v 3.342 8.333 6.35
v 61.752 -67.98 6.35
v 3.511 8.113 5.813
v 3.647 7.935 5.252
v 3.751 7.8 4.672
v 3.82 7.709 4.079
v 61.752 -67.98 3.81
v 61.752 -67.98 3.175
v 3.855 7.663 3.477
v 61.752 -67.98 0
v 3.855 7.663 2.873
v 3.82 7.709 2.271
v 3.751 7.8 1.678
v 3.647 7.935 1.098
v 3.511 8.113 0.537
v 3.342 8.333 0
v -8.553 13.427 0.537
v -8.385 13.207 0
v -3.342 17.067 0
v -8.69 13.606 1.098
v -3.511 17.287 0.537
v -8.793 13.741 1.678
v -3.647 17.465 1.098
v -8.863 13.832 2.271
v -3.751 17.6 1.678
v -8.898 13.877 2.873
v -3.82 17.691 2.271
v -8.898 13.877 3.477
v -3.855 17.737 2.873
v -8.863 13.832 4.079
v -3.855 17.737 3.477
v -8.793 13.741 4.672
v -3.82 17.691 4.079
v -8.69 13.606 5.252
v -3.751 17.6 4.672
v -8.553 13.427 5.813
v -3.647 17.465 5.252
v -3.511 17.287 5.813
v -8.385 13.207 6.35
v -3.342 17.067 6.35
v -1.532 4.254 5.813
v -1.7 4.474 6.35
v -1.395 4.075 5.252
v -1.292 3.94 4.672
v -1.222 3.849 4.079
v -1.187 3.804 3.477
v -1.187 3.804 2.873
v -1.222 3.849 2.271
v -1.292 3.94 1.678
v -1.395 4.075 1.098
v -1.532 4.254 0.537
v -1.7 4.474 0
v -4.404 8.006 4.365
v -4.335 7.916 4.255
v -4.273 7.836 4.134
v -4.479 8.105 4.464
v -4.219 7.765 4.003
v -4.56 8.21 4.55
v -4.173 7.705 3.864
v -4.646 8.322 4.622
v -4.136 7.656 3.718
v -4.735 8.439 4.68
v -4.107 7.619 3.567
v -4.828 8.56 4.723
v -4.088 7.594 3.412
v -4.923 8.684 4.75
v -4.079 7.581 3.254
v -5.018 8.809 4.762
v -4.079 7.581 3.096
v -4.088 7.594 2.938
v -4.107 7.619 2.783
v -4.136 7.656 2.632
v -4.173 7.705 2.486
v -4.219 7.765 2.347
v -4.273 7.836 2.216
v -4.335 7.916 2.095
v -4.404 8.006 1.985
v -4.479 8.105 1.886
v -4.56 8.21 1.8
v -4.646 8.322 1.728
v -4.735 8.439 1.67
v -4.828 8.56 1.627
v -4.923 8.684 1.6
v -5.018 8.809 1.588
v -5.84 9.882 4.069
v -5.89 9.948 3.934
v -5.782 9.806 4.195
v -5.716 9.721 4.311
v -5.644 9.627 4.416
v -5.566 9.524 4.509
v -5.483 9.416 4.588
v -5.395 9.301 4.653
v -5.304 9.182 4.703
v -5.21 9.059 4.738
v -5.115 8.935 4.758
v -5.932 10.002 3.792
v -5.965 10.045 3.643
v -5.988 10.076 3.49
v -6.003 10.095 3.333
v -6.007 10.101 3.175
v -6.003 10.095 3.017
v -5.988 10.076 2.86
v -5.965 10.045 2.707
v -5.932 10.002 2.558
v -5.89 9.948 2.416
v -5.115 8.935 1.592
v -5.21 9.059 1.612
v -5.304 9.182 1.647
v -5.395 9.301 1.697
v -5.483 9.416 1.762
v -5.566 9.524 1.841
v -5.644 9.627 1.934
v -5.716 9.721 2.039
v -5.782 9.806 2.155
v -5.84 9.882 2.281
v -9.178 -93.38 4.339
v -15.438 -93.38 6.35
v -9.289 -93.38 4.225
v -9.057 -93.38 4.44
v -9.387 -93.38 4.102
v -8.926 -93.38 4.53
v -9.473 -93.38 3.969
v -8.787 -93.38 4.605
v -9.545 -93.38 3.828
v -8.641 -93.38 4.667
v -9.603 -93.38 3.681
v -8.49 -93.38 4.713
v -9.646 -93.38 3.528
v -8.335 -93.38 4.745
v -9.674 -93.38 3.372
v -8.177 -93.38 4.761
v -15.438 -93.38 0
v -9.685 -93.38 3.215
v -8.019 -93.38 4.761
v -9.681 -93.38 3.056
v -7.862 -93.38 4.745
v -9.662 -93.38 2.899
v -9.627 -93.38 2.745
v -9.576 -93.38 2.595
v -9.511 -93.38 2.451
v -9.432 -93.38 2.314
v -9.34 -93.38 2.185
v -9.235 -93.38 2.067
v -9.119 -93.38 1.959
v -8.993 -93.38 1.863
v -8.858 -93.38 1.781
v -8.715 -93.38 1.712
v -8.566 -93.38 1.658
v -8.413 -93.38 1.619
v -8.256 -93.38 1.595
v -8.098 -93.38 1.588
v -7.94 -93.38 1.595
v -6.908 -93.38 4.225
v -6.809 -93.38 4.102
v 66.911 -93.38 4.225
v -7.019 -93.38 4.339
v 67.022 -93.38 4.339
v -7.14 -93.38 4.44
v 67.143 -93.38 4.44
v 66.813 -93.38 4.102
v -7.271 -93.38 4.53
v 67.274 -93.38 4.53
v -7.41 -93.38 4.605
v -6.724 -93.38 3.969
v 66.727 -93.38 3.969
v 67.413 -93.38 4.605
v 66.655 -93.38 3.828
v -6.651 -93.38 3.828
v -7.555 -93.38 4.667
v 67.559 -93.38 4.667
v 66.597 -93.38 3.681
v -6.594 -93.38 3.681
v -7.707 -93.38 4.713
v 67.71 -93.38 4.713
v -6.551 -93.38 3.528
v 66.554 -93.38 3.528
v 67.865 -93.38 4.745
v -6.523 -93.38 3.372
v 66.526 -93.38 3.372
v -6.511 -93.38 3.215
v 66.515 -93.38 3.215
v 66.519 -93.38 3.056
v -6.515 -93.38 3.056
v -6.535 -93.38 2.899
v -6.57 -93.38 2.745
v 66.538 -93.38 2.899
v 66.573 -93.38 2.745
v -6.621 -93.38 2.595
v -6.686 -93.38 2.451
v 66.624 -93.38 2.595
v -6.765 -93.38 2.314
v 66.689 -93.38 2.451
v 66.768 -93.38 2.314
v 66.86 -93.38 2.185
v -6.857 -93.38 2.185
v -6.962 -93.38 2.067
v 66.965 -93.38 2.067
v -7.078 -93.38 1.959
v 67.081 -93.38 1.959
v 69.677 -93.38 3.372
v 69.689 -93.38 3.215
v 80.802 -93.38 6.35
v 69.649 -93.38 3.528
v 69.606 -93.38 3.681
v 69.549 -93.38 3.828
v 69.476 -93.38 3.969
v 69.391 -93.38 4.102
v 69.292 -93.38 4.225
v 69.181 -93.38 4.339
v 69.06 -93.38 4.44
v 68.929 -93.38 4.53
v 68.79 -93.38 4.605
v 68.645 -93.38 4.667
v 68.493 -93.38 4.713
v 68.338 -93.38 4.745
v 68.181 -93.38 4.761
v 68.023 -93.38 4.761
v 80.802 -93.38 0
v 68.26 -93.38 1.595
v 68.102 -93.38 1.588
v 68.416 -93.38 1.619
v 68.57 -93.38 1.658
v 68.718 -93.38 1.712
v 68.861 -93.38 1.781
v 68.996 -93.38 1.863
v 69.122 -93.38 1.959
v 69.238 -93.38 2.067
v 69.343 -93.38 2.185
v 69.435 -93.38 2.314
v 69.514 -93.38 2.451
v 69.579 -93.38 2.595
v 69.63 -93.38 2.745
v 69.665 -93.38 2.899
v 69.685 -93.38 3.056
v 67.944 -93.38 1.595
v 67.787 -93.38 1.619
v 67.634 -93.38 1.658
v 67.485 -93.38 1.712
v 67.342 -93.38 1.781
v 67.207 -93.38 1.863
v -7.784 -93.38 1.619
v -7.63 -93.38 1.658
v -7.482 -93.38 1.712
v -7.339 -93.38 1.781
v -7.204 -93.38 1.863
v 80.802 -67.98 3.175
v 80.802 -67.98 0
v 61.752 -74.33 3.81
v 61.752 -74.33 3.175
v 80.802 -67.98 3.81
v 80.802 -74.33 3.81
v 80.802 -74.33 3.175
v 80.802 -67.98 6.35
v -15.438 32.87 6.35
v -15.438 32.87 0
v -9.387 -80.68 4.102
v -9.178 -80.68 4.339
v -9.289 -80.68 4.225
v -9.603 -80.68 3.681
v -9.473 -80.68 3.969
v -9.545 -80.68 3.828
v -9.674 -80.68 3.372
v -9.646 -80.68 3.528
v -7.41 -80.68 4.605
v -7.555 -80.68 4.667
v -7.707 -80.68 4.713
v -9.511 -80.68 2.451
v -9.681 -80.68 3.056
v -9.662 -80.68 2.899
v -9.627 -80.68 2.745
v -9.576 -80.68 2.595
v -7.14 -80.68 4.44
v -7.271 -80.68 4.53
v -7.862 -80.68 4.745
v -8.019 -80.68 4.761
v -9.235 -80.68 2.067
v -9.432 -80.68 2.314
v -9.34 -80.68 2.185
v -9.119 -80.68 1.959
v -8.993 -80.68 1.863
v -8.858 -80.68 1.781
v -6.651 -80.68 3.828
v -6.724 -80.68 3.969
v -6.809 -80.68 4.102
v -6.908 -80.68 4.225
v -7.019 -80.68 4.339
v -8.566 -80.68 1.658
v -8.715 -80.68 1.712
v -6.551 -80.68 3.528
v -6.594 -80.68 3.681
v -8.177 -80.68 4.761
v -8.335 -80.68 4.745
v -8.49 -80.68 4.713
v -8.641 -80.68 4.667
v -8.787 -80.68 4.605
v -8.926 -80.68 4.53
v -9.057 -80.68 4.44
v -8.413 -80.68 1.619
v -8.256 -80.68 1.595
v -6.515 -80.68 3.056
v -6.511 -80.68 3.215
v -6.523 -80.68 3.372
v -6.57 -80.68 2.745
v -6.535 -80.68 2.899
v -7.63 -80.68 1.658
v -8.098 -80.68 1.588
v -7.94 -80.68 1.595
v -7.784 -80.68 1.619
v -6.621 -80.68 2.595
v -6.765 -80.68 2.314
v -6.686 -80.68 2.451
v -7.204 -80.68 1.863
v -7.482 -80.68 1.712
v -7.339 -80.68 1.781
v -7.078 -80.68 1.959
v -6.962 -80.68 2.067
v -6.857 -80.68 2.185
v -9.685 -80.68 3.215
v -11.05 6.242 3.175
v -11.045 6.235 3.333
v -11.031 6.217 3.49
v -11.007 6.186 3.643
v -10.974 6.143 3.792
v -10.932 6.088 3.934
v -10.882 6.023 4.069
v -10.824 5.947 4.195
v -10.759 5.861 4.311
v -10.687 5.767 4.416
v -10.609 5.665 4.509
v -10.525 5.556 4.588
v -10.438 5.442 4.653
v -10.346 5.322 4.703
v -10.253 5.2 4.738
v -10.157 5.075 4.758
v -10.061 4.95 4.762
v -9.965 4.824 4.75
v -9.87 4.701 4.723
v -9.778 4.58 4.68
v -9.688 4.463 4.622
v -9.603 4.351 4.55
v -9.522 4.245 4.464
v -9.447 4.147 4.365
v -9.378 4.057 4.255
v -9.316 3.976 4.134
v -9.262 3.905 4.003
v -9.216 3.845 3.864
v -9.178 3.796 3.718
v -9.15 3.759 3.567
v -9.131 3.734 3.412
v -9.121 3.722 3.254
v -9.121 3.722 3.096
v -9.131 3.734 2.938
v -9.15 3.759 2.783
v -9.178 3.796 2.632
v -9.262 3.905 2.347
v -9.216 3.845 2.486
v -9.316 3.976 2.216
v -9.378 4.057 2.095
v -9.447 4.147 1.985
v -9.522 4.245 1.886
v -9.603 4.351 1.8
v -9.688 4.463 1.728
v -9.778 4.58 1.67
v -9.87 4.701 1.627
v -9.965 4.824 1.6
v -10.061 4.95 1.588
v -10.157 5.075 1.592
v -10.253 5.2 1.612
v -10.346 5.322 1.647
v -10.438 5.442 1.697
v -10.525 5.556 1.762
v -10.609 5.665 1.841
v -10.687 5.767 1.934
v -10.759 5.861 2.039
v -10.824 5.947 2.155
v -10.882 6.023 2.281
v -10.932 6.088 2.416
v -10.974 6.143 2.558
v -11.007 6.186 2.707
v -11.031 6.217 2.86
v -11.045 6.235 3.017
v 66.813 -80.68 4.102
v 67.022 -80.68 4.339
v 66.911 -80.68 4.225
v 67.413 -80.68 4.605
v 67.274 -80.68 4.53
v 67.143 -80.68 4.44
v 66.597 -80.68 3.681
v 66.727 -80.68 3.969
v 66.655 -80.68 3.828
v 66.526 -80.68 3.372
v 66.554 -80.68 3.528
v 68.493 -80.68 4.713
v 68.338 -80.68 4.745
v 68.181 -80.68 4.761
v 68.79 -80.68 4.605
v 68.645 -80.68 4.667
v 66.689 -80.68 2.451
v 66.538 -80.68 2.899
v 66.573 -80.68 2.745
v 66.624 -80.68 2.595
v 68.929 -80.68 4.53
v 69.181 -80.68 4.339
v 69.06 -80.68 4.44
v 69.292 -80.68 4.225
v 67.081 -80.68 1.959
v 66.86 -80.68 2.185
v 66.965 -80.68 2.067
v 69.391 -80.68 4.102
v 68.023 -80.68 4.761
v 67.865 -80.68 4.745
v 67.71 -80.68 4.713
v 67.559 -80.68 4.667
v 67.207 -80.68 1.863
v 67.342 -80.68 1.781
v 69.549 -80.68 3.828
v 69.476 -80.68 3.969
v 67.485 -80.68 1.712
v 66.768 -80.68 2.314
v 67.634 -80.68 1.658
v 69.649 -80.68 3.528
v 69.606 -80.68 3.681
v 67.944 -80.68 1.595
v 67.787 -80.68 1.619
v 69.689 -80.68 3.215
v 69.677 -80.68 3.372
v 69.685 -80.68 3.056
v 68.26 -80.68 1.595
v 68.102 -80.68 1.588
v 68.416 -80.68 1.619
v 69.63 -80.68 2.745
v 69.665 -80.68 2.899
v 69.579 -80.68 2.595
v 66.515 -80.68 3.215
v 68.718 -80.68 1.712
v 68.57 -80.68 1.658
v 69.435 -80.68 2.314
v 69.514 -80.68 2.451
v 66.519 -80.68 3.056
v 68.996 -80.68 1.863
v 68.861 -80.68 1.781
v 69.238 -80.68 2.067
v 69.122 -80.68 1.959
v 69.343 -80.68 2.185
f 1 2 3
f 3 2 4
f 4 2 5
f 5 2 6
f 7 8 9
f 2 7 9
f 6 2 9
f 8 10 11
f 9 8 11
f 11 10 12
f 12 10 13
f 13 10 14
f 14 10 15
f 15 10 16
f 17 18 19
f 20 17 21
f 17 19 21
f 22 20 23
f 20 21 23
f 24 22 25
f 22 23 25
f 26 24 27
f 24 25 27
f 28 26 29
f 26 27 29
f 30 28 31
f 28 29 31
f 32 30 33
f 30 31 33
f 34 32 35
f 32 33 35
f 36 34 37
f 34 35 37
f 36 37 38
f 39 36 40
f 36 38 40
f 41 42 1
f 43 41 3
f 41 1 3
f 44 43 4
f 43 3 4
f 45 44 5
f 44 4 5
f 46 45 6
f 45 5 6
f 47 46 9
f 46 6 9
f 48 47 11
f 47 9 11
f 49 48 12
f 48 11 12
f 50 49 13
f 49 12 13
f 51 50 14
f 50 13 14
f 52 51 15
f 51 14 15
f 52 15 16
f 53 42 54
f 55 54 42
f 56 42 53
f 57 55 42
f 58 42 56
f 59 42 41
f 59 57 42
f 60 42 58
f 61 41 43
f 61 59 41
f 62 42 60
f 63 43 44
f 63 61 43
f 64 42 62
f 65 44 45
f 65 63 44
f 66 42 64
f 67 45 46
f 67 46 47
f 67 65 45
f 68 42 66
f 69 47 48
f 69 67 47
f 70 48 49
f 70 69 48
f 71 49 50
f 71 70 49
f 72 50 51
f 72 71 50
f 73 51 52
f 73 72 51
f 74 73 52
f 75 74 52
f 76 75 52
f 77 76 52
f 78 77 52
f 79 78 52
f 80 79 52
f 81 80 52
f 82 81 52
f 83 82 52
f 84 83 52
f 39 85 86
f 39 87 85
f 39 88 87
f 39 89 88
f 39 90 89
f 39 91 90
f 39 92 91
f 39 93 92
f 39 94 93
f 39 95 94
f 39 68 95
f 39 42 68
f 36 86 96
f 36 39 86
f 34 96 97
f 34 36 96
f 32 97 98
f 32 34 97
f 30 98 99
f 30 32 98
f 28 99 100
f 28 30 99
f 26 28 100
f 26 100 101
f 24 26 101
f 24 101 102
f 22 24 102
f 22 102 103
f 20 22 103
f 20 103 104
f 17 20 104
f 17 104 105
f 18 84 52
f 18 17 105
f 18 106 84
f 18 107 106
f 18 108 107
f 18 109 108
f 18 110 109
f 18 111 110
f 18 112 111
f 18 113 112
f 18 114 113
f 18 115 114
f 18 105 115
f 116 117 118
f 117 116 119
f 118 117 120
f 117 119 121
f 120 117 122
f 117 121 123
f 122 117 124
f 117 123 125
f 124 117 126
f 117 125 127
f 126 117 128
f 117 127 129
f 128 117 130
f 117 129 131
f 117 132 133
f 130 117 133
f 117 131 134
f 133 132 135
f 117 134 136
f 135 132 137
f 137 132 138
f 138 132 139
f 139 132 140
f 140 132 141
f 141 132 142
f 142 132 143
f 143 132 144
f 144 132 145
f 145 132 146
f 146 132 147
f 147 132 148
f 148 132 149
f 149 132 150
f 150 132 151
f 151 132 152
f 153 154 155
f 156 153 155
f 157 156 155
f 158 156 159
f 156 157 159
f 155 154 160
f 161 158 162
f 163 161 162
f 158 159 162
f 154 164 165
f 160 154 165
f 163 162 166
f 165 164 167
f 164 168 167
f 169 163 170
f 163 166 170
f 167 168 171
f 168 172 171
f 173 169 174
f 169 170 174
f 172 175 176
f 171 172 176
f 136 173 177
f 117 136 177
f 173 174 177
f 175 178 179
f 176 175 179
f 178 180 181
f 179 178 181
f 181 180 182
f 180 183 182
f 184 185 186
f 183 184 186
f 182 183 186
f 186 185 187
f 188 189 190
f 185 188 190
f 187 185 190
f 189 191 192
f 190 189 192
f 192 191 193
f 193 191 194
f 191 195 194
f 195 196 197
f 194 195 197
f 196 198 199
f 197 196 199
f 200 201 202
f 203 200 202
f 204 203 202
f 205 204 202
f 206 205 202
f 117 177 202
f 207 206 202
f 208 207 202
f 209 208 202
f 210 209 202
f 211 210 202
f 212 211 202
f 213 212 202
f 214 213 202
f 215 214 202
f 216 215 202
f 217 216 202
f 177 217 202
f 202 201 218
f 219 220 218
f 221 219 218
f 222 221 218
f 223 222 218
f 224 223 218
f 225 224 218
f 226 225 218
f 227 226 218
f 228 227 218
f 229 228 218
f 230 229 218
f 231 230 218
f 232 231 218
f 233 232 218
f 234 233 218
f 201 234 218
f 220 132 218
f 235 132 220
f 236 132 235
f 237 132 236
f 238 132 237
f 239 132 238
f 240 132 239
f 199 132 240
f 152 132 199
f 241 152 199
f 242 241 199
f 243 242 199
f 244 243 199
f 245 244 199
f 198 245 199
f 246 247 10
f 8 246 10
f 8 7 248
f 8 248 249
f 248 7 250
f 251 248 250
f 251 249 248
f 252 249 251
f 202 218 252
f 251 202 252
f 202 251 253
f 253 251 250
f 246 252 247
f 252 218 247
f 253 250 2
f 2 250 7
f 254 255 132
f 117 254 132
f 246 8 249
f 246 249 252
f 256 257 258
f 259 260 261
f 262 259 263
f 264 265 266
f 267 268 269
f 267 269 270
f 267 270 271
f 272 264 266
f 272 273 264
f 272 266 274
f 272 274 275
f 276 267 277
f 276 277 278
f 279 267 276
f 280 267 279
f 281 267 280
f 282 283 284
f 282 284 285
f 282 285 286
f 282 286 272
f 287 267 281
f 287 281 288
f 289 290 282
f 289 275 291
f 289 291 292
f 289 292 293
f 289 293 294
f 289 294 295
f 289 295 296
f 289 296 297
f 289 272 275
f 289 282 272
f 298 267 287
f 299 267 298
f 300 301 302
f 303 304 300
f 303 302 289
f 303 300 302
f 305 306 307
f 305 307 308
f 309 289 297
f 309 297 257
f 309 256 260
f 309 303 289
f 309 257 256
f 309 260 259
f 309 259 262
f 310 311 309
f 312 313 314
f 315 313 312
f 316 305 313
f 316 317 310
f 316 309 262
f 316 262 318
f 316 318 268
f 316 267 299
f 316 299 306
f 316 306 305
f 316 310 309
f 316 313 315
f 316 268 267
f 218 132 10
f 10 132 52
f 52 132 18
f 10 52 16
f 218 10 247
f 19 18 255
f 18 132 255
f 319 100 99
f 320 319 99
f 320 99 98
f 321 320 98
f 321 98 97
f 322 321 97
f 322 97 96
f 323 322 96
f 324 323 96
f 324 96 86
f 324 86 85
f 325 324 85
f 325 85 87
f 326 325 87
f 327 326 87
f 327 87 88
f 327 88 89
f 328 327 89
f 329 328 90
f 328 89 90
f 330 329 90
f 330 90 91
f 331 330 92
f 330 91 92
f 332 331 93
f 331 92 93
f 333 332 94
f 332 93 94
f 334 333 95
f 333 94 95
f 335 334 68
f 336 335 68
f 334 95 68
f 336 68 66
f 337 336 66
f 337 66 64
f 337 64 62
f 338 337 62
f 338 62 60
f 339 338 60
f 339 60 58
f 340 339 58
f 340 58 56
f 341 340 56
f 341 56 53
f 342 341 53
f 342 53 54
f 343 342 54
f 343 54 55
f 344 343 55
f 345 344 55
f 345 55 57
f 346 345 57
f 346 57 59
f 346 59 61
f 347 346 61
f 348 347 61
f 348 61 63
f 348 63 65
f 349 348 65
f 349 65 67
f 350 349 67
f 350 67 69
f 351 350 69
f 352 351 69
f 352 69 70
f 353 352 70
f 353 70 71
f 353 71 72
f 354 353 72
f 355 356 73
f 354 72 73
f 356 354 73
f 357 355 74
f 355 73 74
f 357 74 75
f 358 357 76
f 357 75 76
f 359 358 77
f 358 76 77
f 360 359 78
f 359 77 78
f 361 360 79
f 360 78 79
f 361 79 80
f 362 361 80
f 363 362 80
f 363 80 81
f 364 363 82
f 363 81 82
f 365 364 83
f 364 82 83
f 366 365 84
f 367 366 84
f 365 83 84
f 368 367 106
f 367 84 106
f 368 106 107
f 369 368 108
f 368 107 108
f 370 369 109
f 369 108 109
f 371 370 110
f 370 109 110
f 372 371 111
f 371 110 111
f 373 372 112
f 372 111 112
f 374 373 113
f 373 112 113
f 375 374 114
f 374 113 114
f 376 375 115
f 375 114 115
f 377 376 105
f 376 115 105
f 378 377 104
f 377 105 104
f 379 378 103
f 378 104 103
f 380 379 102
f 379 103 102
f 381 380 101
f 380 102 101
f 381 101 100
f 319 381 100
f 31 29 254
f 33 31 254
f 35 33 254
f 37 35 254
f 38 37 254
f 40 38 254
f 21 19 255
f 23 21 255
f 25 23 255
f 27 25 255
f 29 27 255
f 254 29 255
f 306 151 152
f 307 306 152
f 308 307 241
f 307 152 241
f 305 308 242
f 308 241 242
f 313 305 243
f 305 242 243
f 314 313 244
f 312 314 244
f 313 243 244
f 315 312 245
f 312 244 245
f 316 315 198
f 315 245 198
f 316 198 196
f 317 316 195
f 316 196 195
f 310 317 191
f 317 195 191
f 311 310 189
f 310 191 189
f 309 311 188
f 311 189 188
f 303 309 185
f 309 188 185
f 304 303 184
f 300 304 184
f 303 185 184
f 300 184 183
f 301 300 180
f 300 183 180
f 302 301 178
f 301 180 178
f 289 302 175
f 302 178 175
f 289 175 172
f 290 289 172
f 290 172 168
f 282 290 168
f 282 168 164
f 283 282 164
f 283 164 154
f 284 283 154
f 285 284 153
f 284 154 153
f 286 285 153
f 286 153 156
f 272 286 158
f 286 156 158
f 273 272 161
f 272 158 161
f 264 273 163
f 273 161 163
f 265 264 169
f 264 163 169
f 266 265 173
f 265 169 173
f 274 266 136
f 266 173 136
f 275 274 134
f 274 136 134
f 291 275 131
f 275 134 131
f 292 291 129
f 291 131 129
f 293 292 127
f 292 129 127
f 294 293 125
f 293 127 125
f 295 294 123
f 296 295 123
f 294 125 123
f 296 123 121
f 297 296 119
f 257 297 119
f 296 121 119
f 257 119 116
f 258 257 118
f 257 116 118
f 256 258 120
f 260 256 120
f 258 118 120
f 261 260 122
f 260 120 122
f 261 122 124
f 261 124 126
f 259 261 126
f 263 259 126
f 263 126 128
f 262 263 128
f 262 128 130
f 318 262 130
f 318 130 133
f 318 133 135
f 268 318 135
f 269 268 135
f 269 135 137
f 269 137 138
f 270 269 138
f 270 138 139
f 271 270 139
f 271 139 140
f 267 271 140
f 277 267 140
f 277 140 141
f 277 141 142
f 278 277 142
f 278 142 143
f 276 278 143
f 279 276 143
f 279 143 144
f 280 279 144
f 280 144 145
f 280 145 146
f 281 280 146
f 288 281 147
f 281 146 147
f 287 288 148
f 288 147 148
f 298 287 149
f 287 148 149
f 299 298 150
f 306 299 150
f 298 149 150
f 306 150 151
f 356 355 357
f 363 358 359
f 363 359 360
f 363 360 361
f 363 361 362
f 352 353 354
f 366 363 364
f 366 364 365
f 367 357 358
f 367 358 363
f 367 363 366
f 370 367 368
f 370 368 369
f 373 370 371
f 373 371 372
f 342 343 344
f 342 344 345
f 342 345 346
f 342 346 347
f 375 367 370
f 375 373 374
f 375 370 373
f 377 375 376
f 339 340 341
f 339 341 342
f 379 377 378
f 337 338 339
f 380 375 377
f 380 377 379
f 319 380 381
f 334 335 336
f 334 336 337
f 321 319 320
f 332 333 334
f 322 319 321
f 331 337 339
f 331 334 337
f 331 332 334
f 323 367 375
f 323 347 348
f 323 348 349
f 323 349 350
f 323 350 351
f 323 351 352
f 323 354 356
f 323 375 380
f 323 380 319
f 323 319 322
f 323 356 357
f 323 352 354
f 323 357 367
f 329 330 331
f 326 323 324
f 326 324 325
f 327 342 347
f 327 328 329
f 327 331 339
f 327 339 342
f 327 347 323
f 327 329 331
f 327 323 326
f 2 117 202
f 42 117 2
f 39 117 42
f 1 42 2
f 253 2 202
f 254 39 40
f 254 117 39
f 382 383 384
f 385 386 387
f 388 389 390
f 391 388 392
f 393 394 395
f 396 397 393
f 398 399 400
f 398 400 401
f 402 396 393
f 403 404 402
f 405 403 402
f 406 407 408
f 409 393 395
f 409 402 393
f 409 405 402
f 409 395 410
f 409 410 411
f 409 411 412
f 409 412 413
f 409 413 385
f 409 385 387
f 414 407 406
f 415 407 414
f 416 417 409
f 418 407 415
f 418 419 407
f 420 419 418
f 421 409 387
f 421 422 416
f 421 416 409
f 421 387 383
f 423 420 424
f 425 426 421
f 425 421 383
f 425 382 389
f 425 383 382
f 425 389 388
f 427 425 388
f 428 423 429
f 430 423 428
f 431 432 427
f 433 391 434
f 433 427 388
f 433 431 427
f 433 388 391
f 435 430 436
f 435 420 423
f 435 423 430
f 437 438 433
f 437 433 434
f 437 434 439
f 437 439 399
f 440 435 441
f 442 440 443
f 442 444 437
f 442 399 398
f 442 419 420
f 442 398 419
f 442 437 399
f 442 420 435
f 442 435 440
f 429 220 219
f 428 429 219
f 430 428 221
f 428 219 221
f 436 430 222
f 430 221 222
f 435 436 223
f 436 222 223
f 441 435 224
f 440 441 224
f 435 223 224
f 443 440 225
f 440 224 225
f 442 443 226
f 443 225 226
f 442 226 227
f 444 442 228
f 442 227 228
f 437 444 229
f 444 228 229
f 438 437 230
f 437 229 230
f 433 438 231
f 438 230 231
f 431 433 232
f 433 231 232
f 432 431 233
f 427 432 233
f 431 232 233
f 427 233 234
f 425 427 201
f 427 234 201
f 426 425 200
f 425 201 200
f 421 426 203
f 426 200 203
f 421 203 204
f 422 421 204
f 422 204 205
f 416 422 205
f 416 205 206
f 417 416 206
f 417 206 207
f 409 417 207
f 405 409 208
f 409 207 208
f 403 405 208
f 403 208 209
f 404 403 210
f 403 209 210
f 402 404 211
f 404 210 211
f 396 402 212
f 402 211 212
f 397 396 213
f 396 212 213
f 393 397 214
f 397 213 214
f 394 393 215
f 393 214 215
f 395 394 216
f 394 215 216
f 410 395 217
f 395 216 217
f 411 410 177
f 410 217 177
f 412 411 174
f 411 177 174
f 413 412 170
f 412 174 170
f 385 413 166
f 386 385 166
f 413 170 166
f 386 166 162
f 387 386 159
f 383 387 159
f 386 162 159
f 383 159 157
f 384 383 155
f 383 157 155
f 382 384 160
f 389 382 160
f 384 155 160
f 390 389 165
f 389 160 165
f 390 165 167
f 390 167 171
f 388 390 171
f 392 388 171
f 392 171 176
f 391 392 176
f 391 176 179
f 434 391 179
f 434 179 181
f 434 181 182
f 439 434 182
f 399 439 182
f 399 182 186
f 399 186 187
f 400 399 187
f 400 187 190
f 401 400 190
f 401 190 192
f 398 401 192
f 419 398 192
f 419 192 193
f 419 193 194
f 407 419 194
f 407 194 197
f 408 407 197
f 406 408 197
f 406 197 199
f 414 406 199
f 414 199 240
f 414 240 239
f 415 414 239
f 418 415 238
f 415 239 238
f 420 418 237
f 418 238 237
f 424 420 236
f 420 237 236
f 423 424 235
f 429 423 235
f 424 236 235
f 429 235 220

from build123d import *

# Parameters (mm, degrees)
EXTRUDE1_DEPTH = 6.35
SKETCH3_R      = 1.5875
EXTRUDE2_DEPTH = 12.7
SKETCH4_R      = 1.5875
EXTRUDE3_DEPTH = 12.7
SKETCH6_W      = 19.05
SKETCH6_H      = 0.635
EXTRUDE4_DEPTH = 6.35
SKETCH8_R      = 6.35
EXTRUDE5_DEPTH = 6.35


with BuildPart() as part:
    # Sketch1 → Extrude1 (new body)
    with BuildSketch(Plane.XY):
        Polygon((-15.437909459, 32.870050856), (-15.437909459, -93.380203425), (61.751637834, -93.380203425), (80.801637834, -93.380203425), (80.801637834, -67.980203425), (61.751637834, -67.980203425), align=None)
    extrude(amount=EXTRUDE1_DEPTH)

    # Sketch3 → Extrude2 (cut)
    with BuildSketch(Plane.XZ.offset(93.380203425)):
        with Locations(Location((-8.098362166, 3.175, 0), (0, 0, 270))):
            Circle(SKETCH3_R)
        with Locations(Location((68.101637834, 3.175, 0), (0, 0, 270))):
            Circle(SKETCH3_R)
    extrude(amount=-EXTRUDE2_DEPTH, mode=Mode.SUBTRACT)

    # Sketch4 → Extrude3 (cut)
    with BuildSketch(Plane(origin=(6.12959486, 4.691516702, 0), x_dir=(0, 0, -1), z_dir=(0.7940964904073088, 0.6077917109691402, 0))):
        with Locations(Location((-3.175, 10.085025428, 0), (0, 0, 90))):
            Circle(SKETCH4_R)
    extrude(amount=-EXTRUDE3_DEPTH, mode=Mode.SUBTRACT)

    # Sketch6 → Extrude4 (cut)
    with BuildSketch(Plane(origin=(0, -67.980203425, 0), x_dir=(1, 0, 0), z_dir=(0, 1, 0))):
        with Locations((71.276637834, -3.4925)):
            Rectangle(SKETCH6_W, SKETCH6_H)
    extrude(amount=-EXTRUDE4_DEPTH, mode=Mode.SUBTRACT)

    # Sketch8 → Extrude5 (cut)
    with BuildSketch(Plane(origin=(6.12959486, 4.691516702, 0), x_dir=(0, 0, -1), z_dir=(0.7940964904073088, 0.6077917109691404, 0))):
        with Locations((-3.175, 10.085025428)):
            Circle(SKETCH8_R)
    extrude(amount=-EXTRUDE5_DEPTH, mode=Mode.SUBTRACT)


solid = part.part
